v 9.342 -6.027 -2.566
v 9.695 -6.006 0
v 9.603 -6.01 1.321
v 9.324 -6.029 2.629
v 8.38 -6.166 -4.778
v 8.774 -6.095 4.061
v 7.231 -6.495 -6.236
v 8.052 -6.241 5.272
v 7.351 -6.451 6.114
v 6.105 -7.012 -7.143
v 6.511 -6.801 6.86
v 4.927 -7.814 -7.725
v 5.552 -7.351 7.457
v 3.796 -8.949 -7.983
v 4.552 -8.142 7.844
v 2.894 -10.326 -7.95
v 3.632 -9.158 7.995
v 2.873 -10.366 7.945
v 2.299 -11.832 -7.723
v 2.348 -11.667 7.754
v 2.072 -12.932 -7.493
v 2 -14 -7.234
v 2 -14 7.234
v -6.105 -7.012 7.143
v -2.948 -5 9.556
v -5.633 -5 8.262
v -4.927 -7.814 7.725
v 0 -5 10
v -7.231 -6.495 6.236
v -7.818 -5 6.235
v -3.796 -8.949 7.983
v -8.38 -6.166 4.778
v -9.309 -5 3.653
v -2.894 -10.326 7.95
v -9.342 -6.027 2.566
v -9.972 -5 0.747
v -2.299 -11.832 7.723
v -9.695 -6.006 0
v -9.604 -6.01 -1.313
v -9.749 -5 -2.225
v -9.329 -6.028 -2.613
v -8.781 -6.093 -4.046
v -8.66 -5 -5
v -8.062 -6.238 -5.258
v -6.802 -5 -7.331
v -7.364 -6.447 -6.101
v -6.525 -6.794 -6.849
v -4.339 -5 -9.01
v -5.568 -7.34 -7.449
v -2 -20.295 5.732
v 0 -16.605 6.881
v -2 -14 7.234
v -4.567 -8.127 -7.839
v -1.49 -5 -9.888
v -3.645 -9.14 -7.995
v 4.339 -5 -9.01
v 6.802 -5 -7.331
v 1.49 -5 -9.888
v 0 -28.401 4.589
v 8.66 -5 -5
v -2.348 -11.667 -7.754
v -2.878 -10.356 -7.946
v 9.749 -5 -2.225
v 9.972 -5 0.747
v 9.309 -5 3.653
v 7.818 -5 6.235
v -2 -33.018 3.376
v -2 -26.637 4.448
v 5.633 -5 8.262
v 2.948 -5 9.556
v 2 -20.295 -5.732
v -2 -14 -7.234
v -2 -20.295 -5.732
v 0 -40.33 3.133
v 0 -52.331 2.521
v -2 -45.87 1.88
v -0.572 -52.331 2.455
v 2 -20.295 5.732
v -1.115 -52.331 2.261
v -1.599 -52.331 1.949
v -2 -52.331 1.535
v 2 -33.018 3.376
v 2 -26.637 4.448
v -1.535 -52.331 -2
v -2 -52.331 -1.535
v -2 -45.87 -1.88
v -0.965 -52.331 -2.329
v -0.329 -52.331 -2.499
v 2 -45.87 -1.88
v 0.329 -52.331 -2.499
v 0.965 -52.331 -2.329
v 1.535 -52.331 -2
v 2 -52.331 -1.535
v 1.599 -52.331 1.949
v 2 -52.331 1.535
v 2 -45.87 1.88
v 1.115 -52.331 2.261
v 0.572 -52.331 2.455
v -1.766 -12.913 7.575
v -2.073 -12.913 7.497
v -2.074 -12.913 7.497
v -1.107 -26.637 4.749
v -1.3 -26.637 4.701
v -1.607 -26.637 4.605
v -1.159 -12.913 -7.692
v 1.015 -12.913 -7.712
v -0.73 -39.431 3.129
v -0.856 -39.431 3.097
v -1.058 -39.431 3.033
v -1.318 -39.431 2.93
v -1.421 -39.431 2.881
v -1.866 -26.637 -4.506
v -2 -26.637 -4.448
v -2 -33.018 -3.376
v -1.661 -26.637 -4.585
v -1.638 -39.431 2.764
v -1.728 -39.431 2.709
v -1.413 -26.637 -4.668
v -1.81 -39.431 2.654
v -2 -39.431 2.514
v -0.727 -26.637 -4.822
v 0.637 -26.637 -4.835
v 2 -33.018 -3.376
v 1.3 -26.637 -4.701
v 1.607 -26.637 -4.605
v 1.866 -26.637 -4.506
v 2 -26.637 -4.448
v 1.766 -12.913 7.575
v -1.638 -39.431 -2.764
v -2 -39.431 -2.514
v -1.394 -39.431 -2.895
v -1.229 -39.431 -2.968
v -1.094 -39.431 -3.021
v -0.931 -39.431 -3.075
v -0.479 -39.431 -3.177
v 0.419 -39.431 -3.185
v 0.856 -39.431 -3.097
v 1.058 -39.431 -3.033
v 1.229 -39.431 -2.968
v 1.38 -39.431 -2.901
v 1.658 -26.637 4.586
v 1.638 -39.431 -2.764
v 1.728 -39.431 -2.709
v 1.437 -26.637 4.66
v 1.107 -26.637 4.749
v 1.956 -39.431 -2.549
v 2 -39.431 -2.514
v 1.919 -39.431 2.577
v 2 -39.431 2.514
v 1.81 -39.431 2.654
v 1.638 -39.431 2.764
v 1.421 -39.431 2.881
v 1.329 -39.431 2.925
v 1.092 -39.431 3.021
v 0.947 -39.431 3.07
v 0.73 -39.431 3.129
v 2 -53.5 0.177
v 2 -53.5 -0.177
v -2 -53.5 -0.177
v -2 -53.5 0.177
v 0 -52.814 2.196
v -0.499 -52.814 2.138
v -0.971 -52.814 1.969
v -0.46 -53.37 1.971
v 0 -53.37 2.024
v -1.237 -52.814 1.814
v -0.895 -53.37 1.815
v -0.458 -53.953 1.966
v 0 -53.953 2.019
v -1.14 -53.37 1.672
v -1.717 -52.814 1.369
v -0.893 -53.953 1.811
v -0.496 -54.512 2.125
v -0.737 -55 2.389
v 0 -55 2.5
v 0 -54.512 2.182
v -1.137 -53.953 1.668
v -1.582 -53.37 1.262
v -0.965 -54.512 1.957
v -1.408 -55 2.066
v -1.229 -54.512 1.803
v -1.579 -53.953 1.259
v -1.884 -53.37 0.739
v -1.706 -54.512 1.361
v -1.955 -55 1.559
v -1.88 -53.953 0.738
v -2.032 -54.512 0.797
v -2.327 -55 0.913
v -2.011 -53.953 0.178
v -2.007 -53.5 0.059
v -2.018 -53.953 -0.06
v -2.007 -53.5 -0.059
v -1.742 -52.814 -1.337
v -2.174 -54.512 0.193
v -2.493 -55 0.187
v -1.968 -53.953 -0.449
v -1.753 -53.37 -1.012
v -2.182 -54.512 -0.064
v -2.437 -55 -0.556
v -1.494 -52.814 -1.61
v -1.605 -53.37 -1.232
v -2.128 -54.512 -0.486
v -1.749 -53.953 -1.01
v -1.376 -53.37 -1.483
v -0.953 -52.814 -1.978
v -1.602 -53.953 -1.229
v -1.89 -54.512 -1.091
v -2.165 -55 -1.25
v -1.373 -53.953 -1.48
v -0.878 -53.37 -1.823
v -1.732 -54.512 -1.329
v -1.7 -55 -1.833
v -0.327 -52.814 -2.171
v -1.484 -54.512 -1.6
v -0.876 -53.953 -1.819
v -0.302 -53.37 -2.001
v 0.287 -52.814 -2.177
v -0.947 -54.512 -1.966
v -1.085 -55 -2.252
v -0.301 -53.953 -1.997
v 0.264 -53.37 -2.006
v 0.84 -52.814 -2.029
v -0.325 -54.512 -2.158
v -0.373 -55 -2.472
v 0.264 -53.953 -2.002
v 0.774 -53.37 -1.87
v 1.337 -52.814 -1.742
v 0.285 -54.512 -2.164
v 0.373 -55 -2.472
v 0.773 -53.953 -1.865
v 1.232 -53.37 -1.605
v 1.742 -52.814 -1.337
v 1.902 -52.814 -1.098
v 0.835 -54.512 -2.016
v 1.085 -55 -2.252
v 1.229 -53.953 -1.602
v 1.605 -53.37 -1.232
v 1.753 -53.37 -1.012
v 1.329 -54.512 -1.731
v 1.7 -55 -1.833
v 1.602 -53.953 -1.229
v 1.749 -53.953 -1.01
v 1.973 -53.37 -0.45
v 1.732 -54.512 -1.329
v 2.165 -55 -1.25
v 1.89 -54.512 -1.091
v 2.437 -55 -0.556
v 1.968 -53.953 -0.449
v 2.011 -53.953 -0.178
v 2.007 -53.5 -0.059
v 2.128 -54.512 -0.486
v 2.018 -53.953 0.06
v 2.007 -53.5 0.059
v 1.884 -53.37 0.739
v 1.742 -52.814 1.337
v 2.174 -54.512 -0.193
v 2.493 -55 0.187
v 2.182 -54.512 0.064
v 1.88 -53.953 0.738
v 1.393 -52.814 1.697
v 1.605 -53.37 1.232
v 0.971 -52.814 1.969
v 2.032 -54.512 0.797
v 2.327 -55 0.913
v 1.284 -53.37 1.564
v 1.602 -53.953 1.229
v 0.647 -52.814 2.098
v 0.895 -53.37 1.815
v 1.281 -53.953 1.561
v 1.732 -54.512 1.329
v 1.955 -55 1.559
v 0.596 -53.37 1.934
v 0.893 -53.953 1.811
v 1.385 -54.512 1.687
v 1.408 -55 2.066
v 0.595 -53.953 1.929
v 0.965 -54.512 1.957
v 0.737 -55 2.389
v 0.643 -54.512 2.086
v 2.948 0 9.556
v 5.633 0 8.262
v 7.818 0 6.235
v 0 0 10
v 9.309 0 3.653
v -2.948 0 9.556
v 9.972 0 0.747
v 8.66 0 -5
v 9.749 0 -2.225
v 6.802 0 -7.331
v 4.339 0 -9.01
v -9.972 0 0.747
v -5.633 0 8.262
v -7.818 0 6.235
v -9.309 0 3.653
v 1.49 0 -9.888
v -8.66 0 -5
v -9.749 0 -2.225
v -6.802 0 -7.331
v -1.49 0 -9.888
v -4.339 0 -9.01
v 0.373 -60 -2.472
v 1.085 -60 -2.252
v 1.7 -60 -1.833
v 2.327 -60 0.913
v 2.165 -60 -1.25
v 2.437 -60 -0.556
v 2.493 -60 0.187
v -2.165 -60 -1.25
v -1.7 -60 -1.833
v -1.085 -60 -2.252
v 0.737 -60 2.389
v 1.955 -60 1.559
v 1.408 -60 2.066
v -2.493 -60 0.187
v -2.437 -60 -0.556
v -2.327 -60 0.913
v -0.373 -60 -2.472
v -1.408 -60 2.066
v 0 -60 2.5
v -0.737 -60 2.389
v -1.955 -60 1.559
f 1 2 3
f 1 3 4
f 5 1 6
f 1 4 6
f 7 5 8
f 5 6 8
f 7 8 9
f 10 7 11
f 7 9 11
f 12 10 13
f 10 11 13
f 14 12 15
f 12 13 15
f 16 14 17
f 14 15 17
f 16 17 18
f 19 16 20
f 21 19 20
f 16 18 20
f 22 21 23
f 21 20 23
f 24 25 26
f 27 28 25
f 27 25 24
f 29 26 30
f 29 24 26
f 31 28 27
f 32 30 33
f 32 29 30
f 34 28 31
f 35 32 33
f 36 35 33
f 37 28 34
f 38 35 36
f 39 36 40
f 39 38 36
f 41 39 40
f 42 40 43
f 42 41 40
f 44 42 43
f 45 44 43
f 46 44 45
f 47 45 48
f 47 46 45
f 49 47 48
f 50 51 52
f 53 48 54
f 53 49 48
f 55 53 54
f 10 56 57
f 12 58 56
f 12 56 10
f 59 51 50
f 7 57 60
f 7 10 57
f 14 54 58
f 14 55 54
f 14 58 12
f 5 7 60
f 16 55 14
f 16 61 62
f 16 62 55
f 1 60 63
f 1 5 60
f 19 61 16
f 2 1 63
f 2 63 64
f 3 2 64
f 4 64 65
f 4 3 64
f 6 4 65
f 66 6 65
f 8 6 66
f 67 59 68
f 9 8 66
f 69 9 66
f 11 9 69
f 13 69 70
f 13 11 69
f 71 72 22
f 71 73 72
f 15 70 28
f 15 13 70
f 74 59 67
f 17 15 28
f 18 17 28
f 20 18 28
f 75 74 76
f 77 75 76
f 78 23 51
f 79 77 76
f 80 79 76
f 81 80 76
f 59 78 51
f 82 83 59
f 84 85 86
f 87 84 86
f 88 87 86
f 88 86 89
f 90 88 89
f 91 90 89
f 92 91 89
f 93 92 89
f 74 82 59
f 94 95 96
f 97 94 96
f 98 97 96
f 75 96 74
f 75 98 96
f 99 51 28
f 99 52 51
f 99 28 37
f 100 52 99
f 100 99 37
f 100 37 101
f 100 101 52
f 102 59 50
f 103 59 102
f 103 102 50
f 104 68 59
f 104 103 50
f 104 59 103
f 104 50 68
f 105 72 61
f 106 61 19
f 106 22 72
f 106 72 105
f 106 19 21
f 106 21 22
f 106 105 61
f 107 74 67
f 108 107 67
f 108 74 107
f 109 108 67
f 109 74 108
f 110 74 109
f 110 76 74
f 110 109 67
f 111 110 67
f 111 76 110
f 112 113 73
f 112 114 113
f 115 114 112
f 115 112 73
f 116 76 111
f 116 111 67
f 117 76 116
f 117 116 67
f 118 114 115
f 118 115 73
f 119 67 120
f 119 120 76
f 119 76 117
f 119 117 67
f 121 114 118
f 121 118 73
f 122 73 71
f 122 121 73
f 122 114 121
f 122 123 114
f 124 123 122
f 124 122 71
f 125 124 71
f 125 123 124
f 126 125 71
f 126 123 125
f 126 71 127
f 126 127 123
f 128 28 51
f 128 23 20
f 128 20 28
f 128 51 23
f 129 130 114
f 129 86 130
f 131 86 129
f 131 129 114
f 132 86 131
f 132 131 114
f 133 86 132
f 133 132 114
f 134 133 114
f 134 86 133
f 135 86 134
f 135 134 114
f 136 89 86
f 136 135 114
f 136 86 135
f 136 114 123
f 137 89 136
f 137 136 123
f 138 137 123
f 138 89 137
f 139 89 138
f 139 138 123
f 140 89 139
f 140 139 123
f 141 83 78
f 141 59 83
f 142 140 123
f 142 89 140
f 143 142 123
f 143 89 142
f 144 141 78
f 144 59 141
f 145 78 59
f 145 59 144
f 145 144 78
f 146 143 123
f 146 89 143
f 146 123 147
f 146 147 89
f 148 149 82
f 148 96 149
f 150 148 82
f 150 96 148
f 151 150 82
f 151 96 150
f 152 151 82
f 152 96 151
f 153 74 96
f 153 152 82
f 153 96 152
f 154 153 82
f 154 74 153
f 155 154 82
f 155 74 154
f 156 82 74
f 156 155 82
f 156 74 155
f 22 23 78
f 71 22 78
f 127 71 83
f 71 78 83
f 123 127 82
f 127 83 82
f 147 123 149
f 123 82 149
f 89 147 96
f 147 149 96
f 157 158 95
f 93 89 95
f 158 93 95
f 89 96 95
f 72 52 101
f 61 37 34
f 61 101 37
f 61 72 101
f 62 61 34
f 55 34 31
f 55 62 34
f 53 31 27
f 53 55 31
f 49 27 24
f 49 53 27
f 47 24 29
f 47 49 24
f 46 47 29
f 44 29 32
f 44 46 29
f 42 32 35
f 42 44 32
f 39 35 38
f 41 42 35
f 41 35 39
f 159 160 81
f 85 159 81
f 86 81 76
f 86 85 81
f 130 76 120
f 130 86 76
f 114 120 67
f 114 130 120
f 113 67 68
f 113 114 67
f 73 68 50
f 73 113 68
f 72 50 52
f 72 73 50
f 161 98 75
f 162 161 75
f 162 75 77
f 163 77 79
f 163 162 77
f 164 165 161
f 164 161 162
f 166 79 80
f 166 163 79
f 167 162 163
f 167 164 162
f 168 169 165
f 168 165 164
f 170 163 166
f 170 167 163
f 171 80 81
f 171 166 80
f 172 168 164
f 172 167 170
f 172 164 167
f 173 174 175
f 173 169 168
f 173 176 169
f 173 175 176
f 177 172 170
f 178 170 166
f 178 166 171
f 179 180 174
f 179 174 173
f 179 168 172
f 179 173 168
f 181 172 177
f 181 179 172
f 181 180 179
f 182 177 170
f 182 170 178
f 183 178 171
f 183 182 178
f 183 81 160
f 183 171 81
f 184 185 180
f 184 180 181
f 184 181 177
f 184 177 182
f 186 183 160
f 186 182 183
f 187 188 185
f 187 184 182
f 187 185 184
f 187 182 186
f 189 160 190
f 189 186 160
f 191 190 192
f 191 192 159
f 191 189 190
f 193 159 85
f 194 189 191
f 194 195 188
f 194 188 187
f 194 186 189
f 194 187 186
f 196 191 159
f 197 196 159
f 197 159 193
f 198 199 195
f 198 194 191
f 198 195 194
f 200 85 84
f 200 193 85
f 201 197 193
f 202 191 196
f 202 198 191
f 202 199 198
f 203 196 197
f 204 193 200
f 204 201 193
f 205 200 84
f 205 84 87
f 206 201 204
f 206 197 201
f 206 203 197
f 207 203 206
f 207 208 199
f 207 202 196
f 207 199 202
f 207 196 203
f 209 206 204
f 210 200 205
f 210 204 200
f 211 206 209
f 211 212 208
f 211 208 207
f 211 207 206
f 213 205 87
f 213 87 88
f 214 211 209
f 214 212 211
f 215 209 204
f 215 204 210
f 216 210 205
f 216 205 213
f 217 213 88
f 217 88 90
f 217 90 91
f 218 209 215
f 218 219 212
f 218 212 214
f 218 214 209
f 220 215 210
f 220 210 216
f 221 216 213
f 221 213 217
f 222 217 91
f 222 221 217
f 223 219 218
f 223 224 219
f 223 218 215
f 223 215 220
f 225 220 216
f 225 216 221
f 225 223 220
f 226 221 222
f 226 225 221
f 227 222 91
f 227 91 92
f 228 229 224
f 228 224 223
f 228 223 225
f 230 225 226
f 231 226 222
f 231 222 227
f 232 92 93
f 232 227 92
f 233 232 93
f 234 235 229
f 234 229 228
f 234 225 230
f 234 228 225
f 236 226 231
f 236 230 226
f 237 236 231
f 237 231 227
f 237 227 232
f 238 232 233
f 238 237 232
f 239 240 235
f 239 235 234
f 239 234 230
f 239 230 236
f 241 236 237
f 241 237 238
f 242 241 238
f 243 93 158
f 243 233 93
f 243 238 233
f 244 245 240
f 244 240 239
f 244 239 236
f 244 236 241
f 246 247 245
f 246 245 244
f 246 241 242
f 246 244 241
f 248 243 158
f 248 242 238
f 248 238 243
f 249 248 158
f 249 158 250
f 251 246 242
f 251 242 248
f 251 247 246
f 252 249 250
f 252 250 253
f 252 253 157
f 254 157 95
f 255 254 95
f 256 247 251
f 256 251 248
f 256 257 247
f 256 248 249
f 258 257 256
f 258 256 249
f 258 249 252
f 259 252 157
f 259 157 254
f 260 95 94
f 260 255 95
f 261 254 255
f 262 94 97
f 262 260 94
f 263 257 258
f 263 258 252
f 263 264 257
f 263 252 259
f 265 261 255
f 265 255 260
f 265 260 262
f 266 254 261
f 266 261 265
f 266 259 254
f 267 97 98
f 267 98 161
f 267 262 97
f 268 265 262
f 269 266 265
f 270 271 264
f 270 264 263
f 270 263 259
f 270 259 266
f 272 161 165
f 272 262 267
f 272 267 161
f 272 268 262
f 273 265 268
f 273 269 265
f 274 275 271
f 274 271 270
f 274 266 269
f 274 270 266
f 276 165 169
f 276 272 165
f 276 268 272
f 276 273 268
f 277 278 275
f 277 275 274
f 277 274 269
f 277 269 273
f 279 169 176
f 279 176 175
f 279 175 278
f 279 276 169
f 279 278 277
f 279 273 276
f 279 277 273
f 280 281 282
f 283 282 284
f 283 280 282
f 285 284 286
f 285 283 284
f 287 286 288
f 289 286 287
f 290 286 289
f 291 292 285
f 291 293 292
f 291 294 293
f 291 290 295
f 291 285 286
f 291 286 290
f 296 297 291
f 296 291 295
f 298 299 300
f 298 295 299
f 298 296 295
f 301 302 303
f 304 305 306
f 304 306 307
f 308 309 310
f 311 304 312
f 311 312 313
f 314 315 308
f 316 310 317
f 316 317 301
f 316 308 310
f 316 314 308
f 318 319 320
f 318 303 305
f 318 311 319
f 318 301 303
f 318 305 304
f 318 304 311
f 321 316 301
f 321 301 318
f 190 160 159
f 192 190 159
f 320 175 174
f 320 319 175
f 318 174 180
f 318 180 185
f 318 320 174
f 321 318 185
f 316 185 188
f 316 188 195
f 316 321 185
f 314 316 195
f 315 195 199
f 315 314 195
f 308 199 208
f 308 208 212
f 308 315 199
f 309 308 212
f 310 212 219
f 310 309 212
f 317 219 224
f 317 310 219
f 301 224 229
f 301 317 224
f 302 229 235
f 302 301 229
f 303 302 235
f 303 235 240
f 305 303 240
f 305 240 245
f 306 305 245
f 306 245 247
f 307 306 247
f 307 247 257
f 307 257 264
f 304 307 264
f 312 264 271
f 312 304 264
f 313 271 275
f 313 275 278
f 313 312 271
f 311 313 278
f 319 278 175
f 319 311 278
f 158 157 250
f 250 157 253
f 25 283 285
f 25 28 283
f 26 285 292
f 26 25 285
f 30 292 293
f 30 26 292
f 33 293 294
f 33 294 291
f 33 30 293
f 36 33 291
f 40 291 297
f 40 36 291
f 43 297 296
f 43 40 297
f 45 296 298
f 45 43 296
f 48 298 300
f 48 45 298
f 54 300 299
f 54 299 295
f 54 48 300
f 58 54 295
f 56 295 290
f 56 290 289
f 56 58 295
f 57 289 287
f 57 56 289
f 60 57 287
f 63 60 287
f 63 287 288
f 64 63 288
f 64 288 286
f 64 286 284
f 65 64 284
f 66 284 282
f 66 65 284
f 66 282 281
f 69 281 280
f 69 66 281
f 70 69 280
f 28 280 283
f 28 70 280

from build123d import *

# Parameters (mm, degrees)
F3_DEPTH      = 10.001
F3_DEPTH_BACK = 82


# Not quite as in the source:
# - an extrude ends at something that could not be found from the text; its depth is read off the source's solid


with BuildPart() as f1:
    # F0 (on Right) → F1 (revolve)
    with BuildSketch(Plane.YZ):
        with BuildLine():
            Line((-60, 0), (0, 0))
            Line((0, 0), (0, 10))
            Line((0, 10), (-5, 10))
            ThreePointArc((-5, 10), (-28.4012730043, 4.5885703785), (-52.3309178064, 2.5209029927))
            ThreePointArc((-52.3309178064, 2.5209029927), (-53.6614617682, 2.00006133), (-55, 2.5))
            Line((-55, 2.5), (-60, 2.5))
            Line((-60, 2.5), (-60, 0))
        make_face()
    revolve(axis=Axis((0, -19.4839663044, 0), (0, -1, 0)))

    # F2 (on Top) → F3 (cut, two sides)
    with BuildSketch(Plane.XY) as f3_sk:
        with BuildLine():
            Line((2, -14), (2, -53.5))
            Line((2, -53.5), (10, -53.5))
            Line((10, -53.5), (10, -6))
            ThreePointArc((10, -6), (4.3431457505, -8.3431457505), (2, -14))
        make_face()
        with BuildLine():
            Line((-10, -53.5), (-2, -53.5))
            Line((-2, -53.5), (-2, -14))
            ThreePointArc((-2, -14), (-4.3431457505, -8.3431457505), (-10, -6))
            Line((-10, -6), (-10, -53.5))
        make_face()
    extrude(amount=-F3_DEPTH, mode=Mode.SUBTRACT)
    extrude(f3_sk.sketch, amount=F3_DEPTH_BACK, mode=Mode.SUBTRACT)


solid = f1.part
